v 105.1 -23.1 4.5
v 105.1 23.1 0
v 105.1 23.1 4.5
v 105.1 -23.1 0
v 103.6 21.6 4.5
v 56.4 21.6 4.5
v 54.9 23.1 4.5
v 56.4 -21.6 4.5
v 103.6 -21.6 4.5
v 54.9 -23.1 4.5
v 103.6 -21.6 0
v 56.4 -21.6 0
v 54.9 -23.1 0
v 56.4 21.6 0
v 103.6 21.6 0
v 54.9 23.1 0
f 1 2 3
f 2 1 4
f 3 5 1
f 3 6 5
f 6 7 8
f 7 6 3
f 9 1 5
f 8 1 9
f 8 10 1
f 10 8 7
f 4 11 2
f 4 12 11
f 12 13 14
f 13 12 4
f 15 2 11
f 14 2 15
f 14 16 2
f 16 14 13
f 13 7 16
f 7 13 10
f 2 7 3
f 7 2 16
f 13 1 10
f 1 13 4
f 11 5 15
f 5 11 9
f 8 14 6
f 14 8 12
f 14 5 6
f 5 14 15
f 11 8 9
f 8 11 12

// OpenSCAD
// file: ../library_deh/mag_mount.scad
/* mag_mount.scad

 * ****** Stud magnets ******
16 mm 
http://www.kjmagnetics.com/proddetail.asp?prod=MM-C-16
    Dimensions:
        D=16mm (0.63")
        M=4mm (0.16") (M4 Coarse Male threaded stud)
        H=13mm (0.51")
        h=5mm (0.20")
    Material: NdFeB, Grade N38
    Plating/Coating: Ni-Cu-Ni (Nickel)
    Magnetization Direction: Axial (Poles on Flat Ends)
    Weight: 0.26 oz. (7.37 g)
    Pull Force: 12.1 lbs
    Surface Field: N/A
    Brmax: 12,600 Gauss
    BHmax: 38 MGOe
   $2.49
*/
// Measured dimensions -- 16 mm ** M3 ** stud (default)
 mag_thick = 4.82;	    // Magnet thickness (base to shell top)
 mag_shell_dia = 16.0;	    // Magnet shell OD
 mag_shell_flat_dia = 11;   // Dia of flat of magnet
 mag_stud_dia = 2.8;        // Dia of mounting magnet studs (4-40)
 mag_stud_len = 8.0;        // Height of stud from magnet back
 mag_washer_thick = 1.1;    // Thickness of washer
 mag_nut_thick = 2.4;       // Stud nut (M3) thickness
 mag_nut_hex_flat = 5.41;   // Nut across flats
 mag_nut_hex_peak = 6.20;   // Nut across peaks (also dia of nut)
 mag_washer_dia = 7.1; // 9.5;// Diameter of washer for magnet stud
 mag_washer_dia_extra = 2;  // Washer slop

// Measured dimensions 16 mm -- ** M4 ** stud
 mag16_M4_thick = 5.21;	     // Magnet thickness (base to shell top)
 mag16_M4_shell_dia = 16.0;	     // Magnet shell OD
 mag16_M4_shell_flat_dia = 11.7;  // Dia of flat of magnet
 mag16_M4_stud_dia = 3.64;        // Dia of mounting magnet studs (M4)
 mag16_M4_stud_len = 8.18;        // Height of stud from magnet back
 mag16_M4_nut_thick = 2.98;       // Stud nut (M4) thickness
 mag16_M4_nut_hex_flat = 6.85;    // Nut across flats
 mag16_M4_nut_hex_peak = 7.89;    // Nut across peaks (also dia of nut)
 mag16_M4_washer_thick = 0.85;    // Thickness of washer
 mag16_M4_washer_dia = 8.68;      // Diameter of washer for magnet stud
 mag16_M4_washer_inner_dia = 5.3; // Washer hole diameter
 mag16_M4_washer_dia_extra = 0.5; // Washer slop


/*
http://www.kjmagnetics.com/proddetail.asp?prod=MM-C-20
    Dimensions:
        D=20mm (0.79")
        M=4mm (0.16") (M4 Coarse Male threaded stud)
        H=15mm (0.59")
        h=7mm (0.28")
    Material: NdFeB, Grade N38
    Plating/Coating: Ni-Cu-Ni (Nickel)
    Magnetization Direction: Axial (Poles on Flat Ends)
    Weight: 0.53 oz. (15.0 g)
    Pull Force: 28.7 lbs
    Surface Field: N/A
    Brmax: 12,600 Gauss
    BHmax: 38 MGOe

  $3.14
*/
 mag20_thick = 7.11;	       // Magnet thickness (base to shell top)
 mag20_shell_flat_dia = 20.2;  // Magnet shell OD
 mag20_stud_dia = 3.75;        // Dia of mounting magnet stud at base
 mag20_stud_len = 7.75;        // Height of stud from magnet back
 mag20_washer_thick = 0.85;    // Thickness of washer
 mag20_nut_thick = 2.93;       // Nut for stud thickness
 mag20_nut_hex_peak = 7.89; // Nut across peaks (also dia of nut)
 mag20_washer_dia = 8.68;      // Diameter of washer for magnet stud
 mag20_washer_dia_extra = 0.5; // Washer slop

/*
http://www.kjmagnetics.com/proddetail.asp?prod=MM-C-25

    Dimensions:
        D=25mm (0.98")
        M=5mm (0.20") (M5 Coarse Male threaded stud)
        H=17mm (0.67")
        h=8mm (0.32")
    Material: NdFeB, Grade N38
    Plating/Coating: Ni-Cu-Ni (Nickel)
    Magnetization Direction: Axial (Poles on Flat Ends)
    Weight: 0.92 oz. (26.1 g)
    Pull Force: 48.5 lbs
    Surface Field: N/A
    Brmax: 12,600 Gauss
    BHmax: 38 MGOe
  $4.20
*/
// 25 mm M5
 mag25_thick = 7.75;	      // Magnet thickness (base to shell top)
 mag25_shell_dia = 25.17;     // Magnet shell OD
 mag25_shell_flat_dia = 20;   // Dia of flat of magent
 mag25_stud_dia = 4.82;       // Dia of mounting magnet studs (M5)
 mag25_stud_len = 9.3;        // Height of stud from magnet back
 mag25_washer_thick = 0.97;   // Thickness of washer
 mag25_nut_thick = 3.96;      // M5 Nut for stud thickness
 mag25_nut_hex_flat = 7.93;   // M5 nut across flats
 mag25_nut_hex_peak = 9.16;   // M5 nut across peaks (also dia of nut)
 mag25_washer_dia = 9.8;      // Washer diameter of washer for magnet stud
 mag25_washer_inner_dia = 5.3;// Washer hole diameter
 mag25_washer_dia_extra = 0.5;  // Washer slop

// Cylindrical magnets
mag_cyl_dia = 6.5; 
mag_cyl_ht = 5.05;
// file: ../library_deh/ridged_screw_hole.scad
/*
file: ridged_screw_hole.scad
2018 01 18
*/
/*
All results are translated so that inside edges of the ridges are aligned with the axis, so a 
square or rectangle will have the corner centered on the x,y origin.

Modules----
module ridged_rectangle(xlen,ylen,zlen,rht,rwdy)
module corner_ridged_rectangle(xlen,ylen,zlen,rht,rwdx,rwdy)
module corner_ridged_square(slen,zlen,rht,rwds)
module corner_ridged_square_w_screw(slen,zlen,rht,rwds,scd1,scd2,sch,scofx,scofy)
module corner_ridged_rectangle_w_screw(xlen,ylen,zlen,rht,rwdx,rwdy,scd1,scd2,sch,scofx,scofy)
module ridged_rectangular_w_clip(xlen,ylen,zlen,rht,rwdy,clen)
*/

include <deh_shapes.scad>

/*  ***** ridged_rectangle *****
* xlen = x axis direction length
* ylen = y axis direction length
* zlen = z axis, height to ledge
* rht  = ridge thickness
* rwdy = ridge width, y direction
* NOTE: to convert from right orientation use
* mirror([1,0,0]) for left orientation
*/
module ridged_rectangle(xlen,ylen,zlen,rht,rwdy)
{
	corner_ridged_rectangle(xlen,ylen,zlen,rht,0,rwdy);
}

/*  ***** corner_ridged_rectangle *****
* xlen = x axis direction length
* ylen = y axis direction length
* zlen = z axis, height to ledge
* rht  = ridge thickness
* rwdx = ridge width, x direction
* rwdy = ridge width, y direction
*/
module corner_ridged_rectangle(xlen,ylen,zlen,rht,rwdx,rwdy)
{
    cx = rwdx; cy = -rwdy;
    translate([-cx,cy,0])
    {
        difference()
        {
            union()
            {
                zht1 = (zlen+rht);
                cube([xlen,ylen,zht1],center=false);
            }
            union()
            {
                zht2 = rht+0.1;
                translate([rwdx,rwdy,zlen])
                    cube([xlen,ylen,zht2],center=false);
            }
        }
    }        
}

/*  ***** corner_ridged_square_w_screw *****
* slen = length x & y axis directions
* zlen = z axis, height to ledge
* rht  = ridge thickness
* rwds = ridge width, x & y directions
*/
module corner_ridged_square(slen,zlen,rht,rwds)
{
    corner_ridged_rectangle(slen,slen,zlen,rht,rwds,rwds);
}

/*  ***** corner_ridged_square_w_screw *****
* slen = length x & y axis directions
* zlen = z axis, height to ledge
* rht  = ridge thickness
* rwds = ridge width, x & y directions
* scd1 = screw diameter at top
* scd2 = screw diameter at bottom of screw
* sch  = screw hole height
* scofx = screw hole center offset from inside ridge corner, x
* scofy = screw hole center offset from inside ridge corner, y
*/
        //corner_ridged_square_w_screw(  10,  5, 1.5,  4,  3.2,  1.2,  3,  -1.4,  -1.4  ); // test
module corner_ridged_square_w_screw(slen,zlen,rht,rwds,scd1,scd2,sch,scofx,scofy)
{
    difference()
    {
        corner_ridged_square(slen,zlen,rht,rwds);
        
        translate([0,0,zlen-sch+rht+.01])
            ridge_screw_hole_square(slen,rwds,rwds,scd1,scd2,sch,scofx,scofy);
    }
}

/*  ***** corner_ridged_rectangle_w_screw *****
* xlen = x axis direction length
* ylen = y axis direction length
* zlen = z axis, height to ledge
* rht  = ridge thickness
* rwdx = ridge width, x directions
* rwdy = ridge width, y directions
* scd1 = screw diameter at top
* scd2 = screw diameter at bottom of screw
* sch  = screw hole height
* scofx = screw hole center offset from inside ridge corner, x
* scofy = screw hole center offset from inside ridge corner, y
*/
//translate([20,0,0])
//                                xlen ylen zlen rht dx dy   scd1 scd2  sch  scofx scofy
//corner_ridged_rectangle_w_screw(6,  12,    5, 1.5, 5, 4,    3.2, 2.2,   4,  -1.5,  -2.0); // Test right
//translate([-6,0,0])
//corner_ridged_rectangle_w_screw(6,  12,    5, 1.5, -3, 4,    3.2, 2.2,   4,  -1.5+6,  -2.0); // Test left
module corner_ridged_rectangle_w_screw(xlen,ylen,zlen,rht,rwdx,rwdy,scd1,scd2,sch,scofx,scofy)
{
    difference()
    {
        corner_ridged_rectangle(xlen,ylen,zlen,rht,rwdx,rwdy);
        
        translate([0,0,zlen-sch+rht+.01])
            ridge_screw_hole_rectangle(xlen,ylen,rwdx,rwdy,scd1,scd2,sch,scofx,scofy);
    }
}
/*
* xlen = x axis direction length
* ylen = y axis direction length
* rwdx = ridge width, x directions
* rwdy = ridge width, y directions
* scd1 = screw diameter at top
* scd2 = screw diameter at bottom of screw
* sch  = screw hole height
* scofx = screw hole center offset, x
* scofy = screw hole center offset, y
*/
module ridge_screw_hole_rectangle(xlen,ylen,rwdx,rwdy,scd1,scd2,sch,scofx,scofy)
{
    hx =  scofx;
    hy =   scofy;
//echo("ridge_screw_hole_rectangle","rwdx",rwdx,"rwdy",rwdy);
//echo("ridge_screw_hole_rectangle","scofx",scofx,"scofy",scofy,"hy",hy,"hx",hx);
//echo ("ridge_screw_hole_rectangle",sch);
    translate([hx,hy,0])
        cylinder(d1=scd2,d2=scd1,h=sch,center=false,$fn=25);    
}

module ridge_screw_hole_square(slen,rwdx,rwdy,scd1,scd2,sch,scofx,scofy)
{
    ridge_screw_hole_rectangle(slen,slen,rwdx,rwdy,scd1,scd2,sch,scofx,scofy);
}

/*
pst_ldg = 6 + bfthick;	// Height of pc board ledge from bottom
pst_wid = 3;	// Width of post
pcb_thick = 2.0;	// Thickness of pcb
clip_ht = 3;
pst_w2 = 1;	// Width where pcb contacts edge
*/

/*  ***** ridged_rectangular_w_clip *****
* xlen = x axis direction length
* ylen = y axis direction length
* zlen = z axis, height to ledge
* rht  = height of ridge (pcb thickness)
* rwdy = ridge width, y direction
* clen = clip length
* Orientation: ridge runs in y-axis direction 
* Note: ledge with is (xlen - rwdy)
*/
//         ridged_rectangular_w_clip(  3,  15,   5, 1.5, 1,   3 );	// Test
module ridged_rectangular_w_clip(xlen,ylen,zlen,rht,rwdy,clen)
{
	corner_ridged_rectangle(xlen,ylen,zlen,rht,rwdy,0);

	// Clip overhang
	cofsx = clen - rwdy;	// Offsets for wedge
 	cofsy = ylen;
	cofsz = zlen+rht+clen - rwdy;
	translate([cofsx,cofsy,cofsz])
		rotate([0,180,0])
		rotate([0,0,-90])
		wedge(ylen,clen,clen);

}
// file: ../library_deh/fasteners.scad
/* ***** fasteners.scad *****
 * library of measurements of 
 *   screws, washers, etc.
 * date: 20170512
*/

// 6-32
screw_dia_s632 = 3.35;	// shaft diameter
screw_dia_ph632 = 6.62;	// pan-head diameter
screw_dia_pht632 = 2.2;	// pan-head thickness
nut_dia_632 = 8.77 ;	// peak-peak 
nut_thick_632 = 2.77;	// thickess

// 4-40
screw_dia_s440 = 2.72;	// shaft diameter
screw_dia_s440_z = 1.90; // Dia at tip
screw_dia_ph = 5.42;	// pan-head diamter
screw_dia_pht = 1.7;	// pan-head thickness
nut_dia_440 =  7.12;	// peak-peak
nut_thick_440 = 2.41;	// thickess
nut_dia_440L = 8.88;	// Lock nut diameter
nut_thick_440L = 4.6;	// Lock nut thickness

// 6-20 self-tap
screw_dia_sod620 = 3.5;	// Outer diameter of threads
screw_dia_sth620 = 2.6;	// Self tap hole
screw_dia_pht = 6.7;	// pan-head diameter

// #4
washer_od_4 = 8.0;		// Washer outer diameter
washer_id_4 = 3.2;		// Washer inner diameter
washer_thick_4 = .94;	// Washer thickness

// #6
washer_od_6 = 9.46;	// Washer outer diameter	
washer_id_6 = 4.04;	// Washer inner diameter
washer_thick = 1.04;	// Washer thickness
washer_thick_6 = 1.04;	// Washer thickness

// M3
nut_dia_M3 = 6.5; 
nut_flat_M3 = 5.43;
nut_thick_M3 = 2.29;
washer_od_M3 = 6.9;	// Washer outside diameter
washer_id_M3 = 3.22;	// Washer inside (hole) diameter
washer_thick_M3 = .57;	// Washer thickness

// M4
nut_dia_M4 = 7.86;
nut_flat_M4 = 6.75;
nut_thick_M4 = 2.96;

// #2 6 self drilling Philips Screw (MSC: 124751)
screw_dia1_ss6 = 3.5;	// Self-tapping: dia at threads
screw_dia2_ss6 = 2.8;	// Self-tapping: dia at drilling end
screw_dia_he_ss6 = 6.7;	// Self-tapping: dia of pan head
// file: ../library_deh/Plano_frame.scad
/* File: Plano_frame.scad
 * Plano enclosure PC board fame
 * Author: deh
 * Latest edit: 201700701
 */

include <mag_mount.scad>

 $fn=100;
 
 // Inside dimensions of Plano box
 plano_len          = 152.5;   // flat-flat
 plano_wid          =  76.0;   // flat-flat

base_len = plano_len;
base_wid = plano_wid;
base_ht  = 3.2;		// Thickness of base plate
base_rnd = 10;	// Base plate corner rounding radius
 
 // Stud magnet relative postions.
 // Bottom magnet is on center-line and x,y reference is 0,0
 plano_mag_top_x  = 30.5;   // Top pair x +/- from center-line (C/L)
 plano_mag_top_y  = 138.69; // Top pair y from bottom magnet hole
 plano_mag_top_ofs = 8;    // Top mags to top edge of PC board max
 // Bottom mag distance from bottom of plano wall
 plano_mag_bot_ofs = plano_len - plano_mag_top_ofs - plano_mag_top_y;
 
 
 plano_offs_mag_y   = 4;    // Offset from edge for magnet hole
 plano_offs_mag_x   = 4;    // Offset from edge for magnet hole
 plano_ctr_y    = (plano_len/2);
 plano_ctr_x    = (plano_wid/2);
  
 plano_mag_stud = mag_stud_dia;  // Dia of mounting magnet studs (4-40)
 plano_mag_stud_len = mag_stud_len; // Height of stud from magnet back
 mag_washer_dia = 9.5;      // Diameter of washer for magnet stud
 mag_washer_thick = 1.1;    // Thickness of washer
 mag_washer_dia_extra = 1;  // Washer slop
 plano_web_thick = 2;   // Plano box thickness where stud is 
 mag_wash_recess_dia = mag_washer_dia + mag_washer_dia_extra;

 // Thickness of base for washer recess
 mag_stud_z = (mag_washer_thick +mag_nut_thick + plano_web_thick);
 mag_wash_recess_z = plano_mag_stud_len - mag_stud_z;    

 // Diameter of recess
 mag_wash_recess_dia = mag_washer_dia + mag_washer_dia_extra;

 // POD board
 pod_wid = 76.0;  // Overall width
 pod_len = 89.4;  // Overall length

// Discovery board
 dis_wid = 65.4;  // Overall width
 dis_len = 95.8;  // Overall length
 
// RJ45 connector on POD board
 RJ_offset=24.8; // Side of RJ45 jack from edge
 RJ_wid=15;      // Width of RJ 45 jack
 RJ_depth=14.5;  // Bottom of POD pc board edge to bottom/back of RJ45
 RJ_length=14;  // Front-Back length

// Cutout in base for RJ45 with plug
 RJ_slop = 4;
 RJ_plug_len = 14; // RJ plug protrudes beyond jack
 RJ_cutout_width = RJ_wid + RJ_slop;
 RJ_cutout_length = RJ_length + RJ_slop + RJ_plug_len;
 RJ_cutout_ofs = pod_wid/2 - (RJ_offset + RJ_wid);
 
 // CAN sub-board module
 sub_wid      = 33.75;  // Overall width
 sub_len      = 62.9;   // Overall lengh
 sub_mtg_wid  = 26.6;   // Between mounting holes, width
 sub_mtg_len  = 57.0;   // Between mounting holes, length 

 // Switcher module
 sw_wid =   20.3;   // Overall width
 sw_len =   41.2;   // Overall length
 sw_mtg_off_out_y   = 5.56; // Offset from edge "out" mounting hole 
 sw_mtg_off_out_x   = 2.7;  // Offset from edge "out" mounting hole 
 sw_mtg_off_in_y    = 3.1;  // Offset from edge "in" mounting hole
 sw_mtg_off_in_x    = 6.0;  // Offset from edge "in" mounting hole
 
 // RJ jack (load-cell jack)
 rj_grv =  4.0;  // Groove Depth 
 rj_ht  = 14.2;  // Groove Length
 rj_wid = 14.2;  // Groove Height
 
 // Post ridge
 p_ridge = 1.5; // Height of ridge to position PC board on post
 p_offset = 2;  // Offset of ridge from edge of post
 
 // Pod post
 pod_post_ht = (RJ_depth + 1);
 pod_post_y = 9;    // Length in "y" (long/length) box direction)
 pod_post_x = 6;    // Length in "x" (short/width) box direction)
 pod_post_q = 2.0;  // Width of ridge
 pod_post_s = 2.5;    // Screw hole dia
 pod_post_sd = 5;   // Screw hole depth

 // Pod board clip
 pcwide = 4;        // Width of clip post
 pcleng = 50;       // X axis direction length
 pc_y = base_len;   // y positioning

 iso_len   = 50.2;	// Length: two RJ 45 jacks parallel
 iso_wid   = 46.3;      // Width
 iso_thick = 1.6;	// PC board thickness
 iso_slop  = 0.0;	// Allowance for board variation
 iso_lip   = 1.2;	// Ledge width for board seating
 iso_ridge_ht = 1.55;	// Ridge ht for seat
 iso_ridge_wid= 1.5;	// Ridge width for seat
 iso_post_ht = 3.6;//6.0;	// Height of lip above base

 iso_osd_y = iso_wid + iso_slop - 0.5; // Board y
 iso_osd_x = iso_len + iso_slop - 0.5; // Board x
 iso_side  = iso_lip + iso_ridge_wid;
// file: ../library_deh/deh_shapes2.scad
/* **** deh_shapes2.scad *****
   * Library of useful shapes: chamfers
   * 20180126
*/
//include <../library_deh/deh_shapes.scad>

/* ***** chamfered_corner **********************
 * cx, cy form triangle for bottom chamfer
 * rad = z axis radius for corner
*/ 
module chamfered_corner(cx,cy,rad)
{
    rotate_extrude(angle=90)
        translate([rad,0,0])
            polygon(points=[[0,0],[0,cy],[cx,cy]]);    
}
/* ***** chamfered_rectangle *******************
 * wid  = width, x direction 
 * slen = length, y direction
 * cut  = x & y direction of chamfer
 * rad  = z axis, radius of corner rounding
*/
module chamfered_rectangle(wid,slen,cut,rad)
{
    ofs = cut+rad;
  hull()
  {  
    translate([-wid/2+ofs,ofs,0])
      rotate([0,0,180])
        chamfered_corner(cut,cut,rad);

    translate([ wid/2-ofs,ofs,0])
      rotate([0,0,-90])
        chamfered_corner(cut,cut,rad);

    translate([-wid/2+ofs,slen-ofs,0])
      rotate([0,0,90])
        chamfered_corner(cut,cut,rad);
    
    translate([ wid/2-ofs,slen-ofs,0])
      rotate([0,0,0])
        chamfered_corner(cut,cut,rad);
  } 
}
/* ***** rounded_rectangle_hull ********************
 * wid  = width, x direction 
 * slen = length, y direction
 * ht   = height (or thickness if you prefer)
 * cut  = x & y direction of chamfer
 * rad  = z axis, radius of corner rounding
*/
module rounded_rectangle_hull(wid,slen,ht,cut,rad)
{
 hull()
 {    
    translate([-wid/2+rad,rad,0])
        cylinder(r=rad,h=ht,center=false);

   translate([ wid/2-rad,rad,0])
        cylinder(r=rad,h=ht,center=false);

    translate([-wid/2+rad,slen-rad,0])
        cylinder(r=rad,h=ht,center=false);
    
    translate([ wid/2-rad,slen-rad,0])
        cylinder(r=rad,h=ht,center=false);
 }
}
module half_rounded_rectangle_hull(wid,slen,ht,cut,rad)
{
    ofs= rad;
 hull()
 {    
    translate([-wid/2+ofs,ofs,0])
        cylinder(r=ofs,h=ht,center=false);

    translate([ wid/2-ofs,ofs,0])
        cylinder(r=ofs,h=ht,center=false);

    translate([-wid/2+0.05,slen-0.05,0])
        cylinder(r=0.05,h=ht,center=false);
    
    translate([ wid/2-0.05,slen-0.05,0])
        cylinder(r=0.05,h=ht,center=false);
 }
}

/* ***** composite_chamfered_rectangle **************
 * wid  = width, x direction 
 * slen = length, y direction
 * ht   = height (or thickness if you prefer)
 * cut  = x & y direction of chamfer
 * rad  = z axis, radius of corner rounding less cut
 * NOTE: this places a rounded rectangular cube on top
 *   of a rounded rectangle with a bottom chamfer,
 *   i.e. this is a "base" for a Plano box.
*/
module composite_chamfered_rectangle(wid,slen,ht,cut,rad)
{
echo("composite_chamfered_rectangle","cut",cut,"ht",ht,"rad",rad);    
    chamfered_rectangle(wid,slen,cut,rad);

    translate([0,0,cut])
        rounded_rectangle_hull(wid,slen,ht-cut,cut,rad+cut);
}
//composite_chamfered_rectangle(66,86,5,4,3); // test this module

/* ***** dual_fillet ******************************
 * d  = distance between inside of wedges (x)
 * l  = length (z)
 * w  = width of fillet (x)
 * h  = height of fillet (y)
 */
module dual_fillet(d,l,w,h)
{
	q = d/2;
	  linear_extrude(height = l)
  polygon(points = [[-q,0],[-q,-h],[-q-w,0]]);

	  linear_extrude(height = l)
  polygon(points = [[q,0],[q,-h],[q+w,0]]);
}
/* ***** chamfered_rounded_slot(d,l,t,w,h)
 * d = diameter of rounded end and width of slot (x)
 * l = length (z)
 * t = depth of slot (y) from top to bottom center of circle
 * w = width of fillet at top (x)
 * h = height of fillet (y)
*/
module chamfered_rounded_slot(d,l,t,w,h)
{
	dual_fillet(d,l,w,h);

	    // Rounded end
	translate([0,-t,0])
    cylinder(d = d, h = l, center = false, $fn = 50);

    // Bar
    translate([-d/2, -t, 0])
       cube([d, t, l],false);
}
//chamfered_rounded_slot(4,10,5,1,2); // test
// file: ../library_deh/deh_shapes.scad
/* **** deh_shapes.scad *****
   * Library of useful shapes
   * 20170512
*/

/*  ***** tubedeh *****
d1 = outside diameter
d2 = inside diameter
ht = height
module tubedeh(d1,d2,ht)
reference is center of tube, bottom
*/

module tubedeh(d1,d2,ht)
{
   difference()
   {
     cylinder(d = d1, h = ht, center = false);
     cylinder(d = d2, h = ht + .001, center = false);
   }
}
/* ***** rounded_bar *****
 * rectangular bar with rounded end
bar with one end rounded
rounded_bar(d, l, h)
d = diameter of rounded end, and width of bar
l = length of bar from center of rounded end to end
h = thickness (height) of bar
reference is center of rounded end, bottom
*/
module rounded_bar(d, l, h)
{
    // Rounded end
    cylinder(d = d, h = h, center = false);
    // Bar
    translate([0, -d/2, 0])
       cube([l, d, h],false);
}
/* ***** eyebar *****
 * rounded bar with hole in rounded end
 * module eye_bar(d1, d2, len, ht)
d1 = outside diameter of rounded end, and width of bar
d2 = diameter of hole in end of bar
eye_bar(d1, d2, len, ht);
*/
module eye_bar(d1, d2, len, ht)
{
   difference()
   {   
      rounded_bar(d1,len,ht);
      cylinder(d = d2, h = ht + .001, center = false);
   }
}
/* ***** rounded_rectangle ******
rounded_rectangle(l,w,h,rad);
l = length (x direction)
w = width (y direction)
h = thickness (z direction)
rad = radius of corners
reference = center of rectangle x,y, bottom
*/
module rounded_rectangle(l,w,h,rad)
{
  translate([-(l-rad)/2,-(w-rad)/2,0])
  {
    // Four rounded edges
    translate([0,0,0])
      rounded_bar(rad*2,l-rad,h);
    translate([l-rad,0,0])
      rotate([0,0,90])
      rounded_bar(rad*2,w-rad,h);
    translate([l-rad,w-rad,0])
      rotate([0,0,180])
      rounded_bar(rad*2,l-rad,h);
    translate([0,w-rad,0])
      rotate([0,0,-90])
      rounded_bar(rad*2,w-rad,h);
    // Fill in center
    translate([0,0,0])
      cube([l-rad + .01,w-rad + .01,h],false);
  }
}

/* ***** rounded rim *****
module rounded_rim(l,w,h,rad,tk);
l = length (inside, x direction)
w = width (inside, y direction)
h = thickness (z direction)
rad = radius of corners
tk = thickness of rim wall
*/
module rounded_rim(l,w,h,rad,tk)
{
  difference()
  {
    rounded_rectangle(l+2*tk,w+2*tk,h,rad);
    rounded_rectangle(l, w, h, rad);
  }
}

/* ***** wedge *****
 * l = length
 * w = width
 * h = height/thickness
 * wedge(l, w, h)
*/
 module wedge(l, w, h)
 {
   polyhedron(
      points=[[0,0,0], [l,0,0], [l,w,0], [0,w,0], [0,w,h], [l,w,h]],
       faces=[[0,1,2,3],[5,4,3,2],[0,4,5,1],[0,3,4],[5,2,1]] );
 }
/* **** wedge_isoceles) ****
 * l - z axis length
 * w - y axis length 
 * h - x axis length
 * reference: [0, w/2, 0]
 * wedge_isoceles(l, w, h);
 */

module wedge_isoceles(l, w, h)
 {
  translate([0,0,l])
   rotate([0,90,0])
    translate([0,-w/2,0])
     polyhedron(
      points=[[0,0,0], [l,0,0], [l,w,0], [0,w,0], [0,w/2,h], [l,w/2,h]],
       faces=[[0,1,2,3],[5,4,3,2],[0,4,5,1],[0,3,4],[5,2,1]] );
 }
/* ***** rounded_triangle *****
 * l1 = side 1
 * l2 = side 2
 * l3 = side 3
 * h  = height/thickness
 * rad = radius of rounded corners
 */
module rounded_triangle(l1,l2,l3,h,rad)
{
  // Compute rotation angles
  al3 = acos((l1*l1 + l2*l2 - l3*l3)/(2 * l1 * l2));
  al1 = acos((l2*l2 + l3*l3 - l1*l1)/(2 * l2 * l3));
  al2 = acos((l3*l3 + l1*l1 - l2*l2)/(2 * l3 * l1));
  // Setup bars for edges
  translate([0,0,0])
    rotate([0,0,0])
      rounded_bar(rad,l3,h);
  translate([l3,0,0])
    rotate([0,0,180-al2])
      rounded_bar(rad,l1,h);
  rotate([0,0,al1])
    translate([l2,0,0])
      rotate([0,0,180])
        rounded_bar(rad,l2,h);
  // Fill in center
    triangle(l1,l2,l3,h);
}
/* ***** triangle *****
 * l1 = side 1
 * l2 = side 2
 * l3 = side 3
 * h  = height/thickness
 * triangle(l1,l2,l3,h);
 */
module triangle(l1,l2,l3,h)
{
  // Compute rotation angle
  al1 = acos((l2*l2 + l3*l3 - l1*l1)/(2 * l2 * l3));
  
  linear_extrude(height = h)
  polygon(points = [[0,0],[l3,0],[l2*cos(al1),l2*sin(al1)]]);
}
/* ***** chamfered hole *****
 * Punch hole with chamfer on one end
 * d1 = main hole diameter
 * d2 = hole diameter at chamfered end
 * ht1 = height of whole hole
 * ht2 = depth of  chamfer
*/
module chamfered_hole(d1,d2,ht1,ht2)
{
   rotate_extrude(convexity = 10)
     polygon(points = [[0,0],[d1/2,0],[d1/2,ht1-ht2],[d2/2,ht1],[0,ht1]]);

}

/* ***** fillet *****
 * r = radius of fillet
 * l = length of fillet
 fillet (r,l);
*/
module fillet(r,l)
{
   difference()
   {
     union()
     {
       cube([2*r,2*r,l]);
     }
     union()
     {
       translate ([r,r,0])
           cylinder(d = 2*r + 0.1, h = l, center = false);
       translate([r,0,0])
           cube([r,2*r,l],center = false);
       translate([0,r,0])
           cube([2*r,r,l],center = false);
     }
   }
}
/* ***** circular chamfer *****
 * d = outer diameter
 * rad = chamfer radius
 * circular_chamfer(d, rad);
*/
module circular_chamfer(d, rad)
{
  ofs = (d/2 - rad);
  rotate_extrude()
  translate([ofs,0])
   difference()
   {
     union()
     {
       square(size = [rad, rad]);
     }
     union()
     {
       translate ([0,rad ])
           circle(d = 2*rad + 0.1);
     }
   }
}
module circular_inner_chamfer(d, rad)
{
  circular_chamfer(d, rad);
} 

/* ***** circular chamfer *****
 * d = inner diameter
 * rad = chamfer radius
 * circular_chamfer(d, rad);
*/
module circular_outer_chamfer(d, rad)
{
  ofs = (d/2 - rad);
  rotate_extrude()
  translate([ofs,0])
   difference()
   {
     union()
     {
       square(size = [rad, rad]);
     }
     union()
     {
       translate ([rad,rad ])
           circle(d = 2*rad + 0.1);
     }
   }
}
// main file
/* File: pwrX1plt.scad
 * Power unit: switcher plates
 * Author: deh
 * Latest edit: 20180603
 * 
 */

include <../library_deh/deh_shapes.scad>
include <../library_deh/deh_shapes2.scad>
include <../library_deh/Plano_frame.scad>
include <../library_deh/fasteners.scad>
include <../library_deh/ridged_screw_hole.scad>

 $fn=50;

plt1_len = 52+2.5;
plt1_wid = 52 - 4;
plt1_thx = 1.5; 		// End plate thickness
plt1_rad = 2;
plt1_tab_ovr = 8;		// Tab overlap depth on sides
plt1_tab_thx = 2;		// Width/thickness of overlap tab


u = 0.5;	// 
swx_len = 50.2 + u;	// Switcher pcb length
swx_wid = 46.2 + u;	// Switcher pcb width
swx_thx = 1.5 + 0.3;	// Switcher pcb thickness
swx_bot_thx = 4.0;	// Space below pcb

module plate1()
{
	difference()
	{
		union()
		{
			/* ***** rounded_rectangle ******
rounded_rectangle(l,w,h,rad);
l = length (x direction)
w = width (y direction)
h = thickness (z direction)
rad = radius of corners
reference = center of rectangle x,y, bottom
*/
len1 = plt1_len + 2*plt1_tab_thx;
wid1 = plt1_wid;
thx1 = plt1_thx + plt1_tab_ovr + swx_bot_thx + swx_thx;

			rounded_rectangle(len1,wid1,thx1,plt1_rad);

		}

		union()
		{
			k = 1.5;	// Edge ridge width
			len2 = swx_len - k;
			wid2 = swx_wid - k;
		   cube([len2,wid2,50],center=true);

			ofz3 = 50/2 + plt1_thx/2;
			translate([0,0,ofz3])
				cube([swx_len,swx_wid,50],center=true);

			ofz4 = 50/2 + swx_bot_thx + swx_thx + plt1_thx;
			len4 = plt1_len + 0.3;
			translate([0,0,ofz4])
				cube([len4,90,50],center=true);

			ofx5 = 20;
			plate1_side_hole(    0);
			plate1_side_hole( ofx5);
			plate1_side_hole(-ofx5);
		}
	}	
}
plt1_sid_hole_d = 3.4; // Side hole diameter
module plate1_side_hole(dx)
{
ofz = plt1_thx + plt1_tab_ovr + swx_bot_thx + swx_thx - 4;
	translate([0,dx,ofz])
		rotate([0,90,0])
			cylinder(d=plt1_sid_hole_d, h = 200, center=true);
}

/* Spacer between underside of pcb and block */
module plate2()
{
j = 0.5;
	difference()
	{
		union()
		{
			thx1 = swx_bot_thx + 0.5;
			ofz1 = thx1/2;
			translate([0,0,ofz1])
				cube([swx_len-j,swx_wid-j,thx1],center=true);
		}

		union()
		{
			k2 = 3.0;	// Edge ridge width
			len2 = swx_len - k2 - j;
			wid2 = swx_wid - k2 - j;
		   cube([len2,wid2,50],center=true);
		}
	}	
}
//plate1();

translate([80,0,0]) plate2();
